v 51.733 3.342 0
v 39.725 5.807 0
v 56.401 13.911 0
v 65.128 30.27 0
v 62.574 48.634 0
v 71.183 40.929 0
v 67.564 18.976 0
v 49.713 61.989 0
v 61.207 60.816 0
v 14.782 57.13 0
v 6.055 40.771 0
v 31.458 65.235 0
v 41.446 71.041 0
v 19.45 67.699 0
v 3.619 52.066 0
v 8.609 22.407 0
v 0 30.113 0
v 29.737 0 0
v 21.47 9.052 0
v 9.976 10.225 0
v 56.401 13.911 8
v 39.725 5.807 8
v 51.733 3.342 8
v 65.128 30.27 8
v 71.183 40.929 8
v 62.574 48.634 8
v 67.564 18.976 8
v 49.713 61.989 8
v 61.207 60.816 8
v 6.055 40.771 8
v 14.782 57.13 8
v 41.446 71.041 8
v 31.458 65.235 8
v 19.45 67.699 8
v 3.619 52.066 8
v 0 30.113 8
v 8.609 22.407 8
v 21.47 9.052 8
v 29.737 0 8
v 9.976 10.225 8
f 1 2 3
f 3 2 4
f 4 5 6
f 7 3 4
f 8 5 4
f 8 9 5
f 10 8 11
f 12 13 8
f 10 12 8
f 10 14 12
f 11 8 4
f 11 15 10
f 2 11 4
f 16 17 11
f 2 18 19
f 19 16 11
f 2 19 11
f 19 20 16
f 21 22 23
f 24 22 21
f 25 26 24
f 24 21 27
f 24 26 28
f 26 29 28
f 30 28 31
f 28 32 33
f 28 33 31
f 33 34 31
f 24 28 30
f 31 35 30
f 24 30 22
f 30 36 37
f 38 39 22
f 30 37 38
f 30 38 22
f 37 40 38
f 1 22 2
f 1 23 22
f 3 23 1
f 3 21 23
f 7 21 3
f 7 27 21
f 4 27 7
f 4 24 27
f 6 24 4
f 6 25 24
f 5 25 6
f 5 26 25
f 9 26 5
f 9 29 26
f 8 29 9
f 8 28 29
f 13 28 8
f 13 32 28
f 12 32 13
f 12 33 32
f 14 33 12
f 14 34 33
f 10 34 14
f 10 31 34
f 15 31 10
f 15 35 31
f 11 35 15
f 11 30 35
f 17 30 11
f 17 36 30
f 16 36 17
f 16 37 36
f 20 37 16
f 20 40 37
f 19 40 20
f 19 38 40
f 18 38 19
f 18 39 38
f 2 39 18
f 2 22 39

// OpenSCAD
$fn = 32;

// ----------------------------------------------------------------------
// Chain sprocket: 10 teeth, 30 mm root radius
// ----------------------------------------------------------------------

// --- parameters (mm) ---
profile_height = 8;       // extrusion height
profile_points = 20;      // points of the closed outline

profile = [[65.128, 30.27], [71.183, 40.929], [62.574, 48.634], [61.207, 60.816], [49.713, 61.989], [41.446, 71.041], [31.458, 65.235], [19.45, 67.699], [14.782, 57.13], [3.619, 52.066], [6.055, 40.771], [0, 30.113], [8.609, 22.407], [9.976, 10.225], [21.47, 9.052], [29.737, 0], [39.725, 5.807], [51.733, 3.342], [56.401, 13.911], [67.564, 18.976]];  // single closed polygon, 20 points, counter clockwise

// --- the one profile operation ---
linear_extrude(height = profile_height) polygon(points = profile);
